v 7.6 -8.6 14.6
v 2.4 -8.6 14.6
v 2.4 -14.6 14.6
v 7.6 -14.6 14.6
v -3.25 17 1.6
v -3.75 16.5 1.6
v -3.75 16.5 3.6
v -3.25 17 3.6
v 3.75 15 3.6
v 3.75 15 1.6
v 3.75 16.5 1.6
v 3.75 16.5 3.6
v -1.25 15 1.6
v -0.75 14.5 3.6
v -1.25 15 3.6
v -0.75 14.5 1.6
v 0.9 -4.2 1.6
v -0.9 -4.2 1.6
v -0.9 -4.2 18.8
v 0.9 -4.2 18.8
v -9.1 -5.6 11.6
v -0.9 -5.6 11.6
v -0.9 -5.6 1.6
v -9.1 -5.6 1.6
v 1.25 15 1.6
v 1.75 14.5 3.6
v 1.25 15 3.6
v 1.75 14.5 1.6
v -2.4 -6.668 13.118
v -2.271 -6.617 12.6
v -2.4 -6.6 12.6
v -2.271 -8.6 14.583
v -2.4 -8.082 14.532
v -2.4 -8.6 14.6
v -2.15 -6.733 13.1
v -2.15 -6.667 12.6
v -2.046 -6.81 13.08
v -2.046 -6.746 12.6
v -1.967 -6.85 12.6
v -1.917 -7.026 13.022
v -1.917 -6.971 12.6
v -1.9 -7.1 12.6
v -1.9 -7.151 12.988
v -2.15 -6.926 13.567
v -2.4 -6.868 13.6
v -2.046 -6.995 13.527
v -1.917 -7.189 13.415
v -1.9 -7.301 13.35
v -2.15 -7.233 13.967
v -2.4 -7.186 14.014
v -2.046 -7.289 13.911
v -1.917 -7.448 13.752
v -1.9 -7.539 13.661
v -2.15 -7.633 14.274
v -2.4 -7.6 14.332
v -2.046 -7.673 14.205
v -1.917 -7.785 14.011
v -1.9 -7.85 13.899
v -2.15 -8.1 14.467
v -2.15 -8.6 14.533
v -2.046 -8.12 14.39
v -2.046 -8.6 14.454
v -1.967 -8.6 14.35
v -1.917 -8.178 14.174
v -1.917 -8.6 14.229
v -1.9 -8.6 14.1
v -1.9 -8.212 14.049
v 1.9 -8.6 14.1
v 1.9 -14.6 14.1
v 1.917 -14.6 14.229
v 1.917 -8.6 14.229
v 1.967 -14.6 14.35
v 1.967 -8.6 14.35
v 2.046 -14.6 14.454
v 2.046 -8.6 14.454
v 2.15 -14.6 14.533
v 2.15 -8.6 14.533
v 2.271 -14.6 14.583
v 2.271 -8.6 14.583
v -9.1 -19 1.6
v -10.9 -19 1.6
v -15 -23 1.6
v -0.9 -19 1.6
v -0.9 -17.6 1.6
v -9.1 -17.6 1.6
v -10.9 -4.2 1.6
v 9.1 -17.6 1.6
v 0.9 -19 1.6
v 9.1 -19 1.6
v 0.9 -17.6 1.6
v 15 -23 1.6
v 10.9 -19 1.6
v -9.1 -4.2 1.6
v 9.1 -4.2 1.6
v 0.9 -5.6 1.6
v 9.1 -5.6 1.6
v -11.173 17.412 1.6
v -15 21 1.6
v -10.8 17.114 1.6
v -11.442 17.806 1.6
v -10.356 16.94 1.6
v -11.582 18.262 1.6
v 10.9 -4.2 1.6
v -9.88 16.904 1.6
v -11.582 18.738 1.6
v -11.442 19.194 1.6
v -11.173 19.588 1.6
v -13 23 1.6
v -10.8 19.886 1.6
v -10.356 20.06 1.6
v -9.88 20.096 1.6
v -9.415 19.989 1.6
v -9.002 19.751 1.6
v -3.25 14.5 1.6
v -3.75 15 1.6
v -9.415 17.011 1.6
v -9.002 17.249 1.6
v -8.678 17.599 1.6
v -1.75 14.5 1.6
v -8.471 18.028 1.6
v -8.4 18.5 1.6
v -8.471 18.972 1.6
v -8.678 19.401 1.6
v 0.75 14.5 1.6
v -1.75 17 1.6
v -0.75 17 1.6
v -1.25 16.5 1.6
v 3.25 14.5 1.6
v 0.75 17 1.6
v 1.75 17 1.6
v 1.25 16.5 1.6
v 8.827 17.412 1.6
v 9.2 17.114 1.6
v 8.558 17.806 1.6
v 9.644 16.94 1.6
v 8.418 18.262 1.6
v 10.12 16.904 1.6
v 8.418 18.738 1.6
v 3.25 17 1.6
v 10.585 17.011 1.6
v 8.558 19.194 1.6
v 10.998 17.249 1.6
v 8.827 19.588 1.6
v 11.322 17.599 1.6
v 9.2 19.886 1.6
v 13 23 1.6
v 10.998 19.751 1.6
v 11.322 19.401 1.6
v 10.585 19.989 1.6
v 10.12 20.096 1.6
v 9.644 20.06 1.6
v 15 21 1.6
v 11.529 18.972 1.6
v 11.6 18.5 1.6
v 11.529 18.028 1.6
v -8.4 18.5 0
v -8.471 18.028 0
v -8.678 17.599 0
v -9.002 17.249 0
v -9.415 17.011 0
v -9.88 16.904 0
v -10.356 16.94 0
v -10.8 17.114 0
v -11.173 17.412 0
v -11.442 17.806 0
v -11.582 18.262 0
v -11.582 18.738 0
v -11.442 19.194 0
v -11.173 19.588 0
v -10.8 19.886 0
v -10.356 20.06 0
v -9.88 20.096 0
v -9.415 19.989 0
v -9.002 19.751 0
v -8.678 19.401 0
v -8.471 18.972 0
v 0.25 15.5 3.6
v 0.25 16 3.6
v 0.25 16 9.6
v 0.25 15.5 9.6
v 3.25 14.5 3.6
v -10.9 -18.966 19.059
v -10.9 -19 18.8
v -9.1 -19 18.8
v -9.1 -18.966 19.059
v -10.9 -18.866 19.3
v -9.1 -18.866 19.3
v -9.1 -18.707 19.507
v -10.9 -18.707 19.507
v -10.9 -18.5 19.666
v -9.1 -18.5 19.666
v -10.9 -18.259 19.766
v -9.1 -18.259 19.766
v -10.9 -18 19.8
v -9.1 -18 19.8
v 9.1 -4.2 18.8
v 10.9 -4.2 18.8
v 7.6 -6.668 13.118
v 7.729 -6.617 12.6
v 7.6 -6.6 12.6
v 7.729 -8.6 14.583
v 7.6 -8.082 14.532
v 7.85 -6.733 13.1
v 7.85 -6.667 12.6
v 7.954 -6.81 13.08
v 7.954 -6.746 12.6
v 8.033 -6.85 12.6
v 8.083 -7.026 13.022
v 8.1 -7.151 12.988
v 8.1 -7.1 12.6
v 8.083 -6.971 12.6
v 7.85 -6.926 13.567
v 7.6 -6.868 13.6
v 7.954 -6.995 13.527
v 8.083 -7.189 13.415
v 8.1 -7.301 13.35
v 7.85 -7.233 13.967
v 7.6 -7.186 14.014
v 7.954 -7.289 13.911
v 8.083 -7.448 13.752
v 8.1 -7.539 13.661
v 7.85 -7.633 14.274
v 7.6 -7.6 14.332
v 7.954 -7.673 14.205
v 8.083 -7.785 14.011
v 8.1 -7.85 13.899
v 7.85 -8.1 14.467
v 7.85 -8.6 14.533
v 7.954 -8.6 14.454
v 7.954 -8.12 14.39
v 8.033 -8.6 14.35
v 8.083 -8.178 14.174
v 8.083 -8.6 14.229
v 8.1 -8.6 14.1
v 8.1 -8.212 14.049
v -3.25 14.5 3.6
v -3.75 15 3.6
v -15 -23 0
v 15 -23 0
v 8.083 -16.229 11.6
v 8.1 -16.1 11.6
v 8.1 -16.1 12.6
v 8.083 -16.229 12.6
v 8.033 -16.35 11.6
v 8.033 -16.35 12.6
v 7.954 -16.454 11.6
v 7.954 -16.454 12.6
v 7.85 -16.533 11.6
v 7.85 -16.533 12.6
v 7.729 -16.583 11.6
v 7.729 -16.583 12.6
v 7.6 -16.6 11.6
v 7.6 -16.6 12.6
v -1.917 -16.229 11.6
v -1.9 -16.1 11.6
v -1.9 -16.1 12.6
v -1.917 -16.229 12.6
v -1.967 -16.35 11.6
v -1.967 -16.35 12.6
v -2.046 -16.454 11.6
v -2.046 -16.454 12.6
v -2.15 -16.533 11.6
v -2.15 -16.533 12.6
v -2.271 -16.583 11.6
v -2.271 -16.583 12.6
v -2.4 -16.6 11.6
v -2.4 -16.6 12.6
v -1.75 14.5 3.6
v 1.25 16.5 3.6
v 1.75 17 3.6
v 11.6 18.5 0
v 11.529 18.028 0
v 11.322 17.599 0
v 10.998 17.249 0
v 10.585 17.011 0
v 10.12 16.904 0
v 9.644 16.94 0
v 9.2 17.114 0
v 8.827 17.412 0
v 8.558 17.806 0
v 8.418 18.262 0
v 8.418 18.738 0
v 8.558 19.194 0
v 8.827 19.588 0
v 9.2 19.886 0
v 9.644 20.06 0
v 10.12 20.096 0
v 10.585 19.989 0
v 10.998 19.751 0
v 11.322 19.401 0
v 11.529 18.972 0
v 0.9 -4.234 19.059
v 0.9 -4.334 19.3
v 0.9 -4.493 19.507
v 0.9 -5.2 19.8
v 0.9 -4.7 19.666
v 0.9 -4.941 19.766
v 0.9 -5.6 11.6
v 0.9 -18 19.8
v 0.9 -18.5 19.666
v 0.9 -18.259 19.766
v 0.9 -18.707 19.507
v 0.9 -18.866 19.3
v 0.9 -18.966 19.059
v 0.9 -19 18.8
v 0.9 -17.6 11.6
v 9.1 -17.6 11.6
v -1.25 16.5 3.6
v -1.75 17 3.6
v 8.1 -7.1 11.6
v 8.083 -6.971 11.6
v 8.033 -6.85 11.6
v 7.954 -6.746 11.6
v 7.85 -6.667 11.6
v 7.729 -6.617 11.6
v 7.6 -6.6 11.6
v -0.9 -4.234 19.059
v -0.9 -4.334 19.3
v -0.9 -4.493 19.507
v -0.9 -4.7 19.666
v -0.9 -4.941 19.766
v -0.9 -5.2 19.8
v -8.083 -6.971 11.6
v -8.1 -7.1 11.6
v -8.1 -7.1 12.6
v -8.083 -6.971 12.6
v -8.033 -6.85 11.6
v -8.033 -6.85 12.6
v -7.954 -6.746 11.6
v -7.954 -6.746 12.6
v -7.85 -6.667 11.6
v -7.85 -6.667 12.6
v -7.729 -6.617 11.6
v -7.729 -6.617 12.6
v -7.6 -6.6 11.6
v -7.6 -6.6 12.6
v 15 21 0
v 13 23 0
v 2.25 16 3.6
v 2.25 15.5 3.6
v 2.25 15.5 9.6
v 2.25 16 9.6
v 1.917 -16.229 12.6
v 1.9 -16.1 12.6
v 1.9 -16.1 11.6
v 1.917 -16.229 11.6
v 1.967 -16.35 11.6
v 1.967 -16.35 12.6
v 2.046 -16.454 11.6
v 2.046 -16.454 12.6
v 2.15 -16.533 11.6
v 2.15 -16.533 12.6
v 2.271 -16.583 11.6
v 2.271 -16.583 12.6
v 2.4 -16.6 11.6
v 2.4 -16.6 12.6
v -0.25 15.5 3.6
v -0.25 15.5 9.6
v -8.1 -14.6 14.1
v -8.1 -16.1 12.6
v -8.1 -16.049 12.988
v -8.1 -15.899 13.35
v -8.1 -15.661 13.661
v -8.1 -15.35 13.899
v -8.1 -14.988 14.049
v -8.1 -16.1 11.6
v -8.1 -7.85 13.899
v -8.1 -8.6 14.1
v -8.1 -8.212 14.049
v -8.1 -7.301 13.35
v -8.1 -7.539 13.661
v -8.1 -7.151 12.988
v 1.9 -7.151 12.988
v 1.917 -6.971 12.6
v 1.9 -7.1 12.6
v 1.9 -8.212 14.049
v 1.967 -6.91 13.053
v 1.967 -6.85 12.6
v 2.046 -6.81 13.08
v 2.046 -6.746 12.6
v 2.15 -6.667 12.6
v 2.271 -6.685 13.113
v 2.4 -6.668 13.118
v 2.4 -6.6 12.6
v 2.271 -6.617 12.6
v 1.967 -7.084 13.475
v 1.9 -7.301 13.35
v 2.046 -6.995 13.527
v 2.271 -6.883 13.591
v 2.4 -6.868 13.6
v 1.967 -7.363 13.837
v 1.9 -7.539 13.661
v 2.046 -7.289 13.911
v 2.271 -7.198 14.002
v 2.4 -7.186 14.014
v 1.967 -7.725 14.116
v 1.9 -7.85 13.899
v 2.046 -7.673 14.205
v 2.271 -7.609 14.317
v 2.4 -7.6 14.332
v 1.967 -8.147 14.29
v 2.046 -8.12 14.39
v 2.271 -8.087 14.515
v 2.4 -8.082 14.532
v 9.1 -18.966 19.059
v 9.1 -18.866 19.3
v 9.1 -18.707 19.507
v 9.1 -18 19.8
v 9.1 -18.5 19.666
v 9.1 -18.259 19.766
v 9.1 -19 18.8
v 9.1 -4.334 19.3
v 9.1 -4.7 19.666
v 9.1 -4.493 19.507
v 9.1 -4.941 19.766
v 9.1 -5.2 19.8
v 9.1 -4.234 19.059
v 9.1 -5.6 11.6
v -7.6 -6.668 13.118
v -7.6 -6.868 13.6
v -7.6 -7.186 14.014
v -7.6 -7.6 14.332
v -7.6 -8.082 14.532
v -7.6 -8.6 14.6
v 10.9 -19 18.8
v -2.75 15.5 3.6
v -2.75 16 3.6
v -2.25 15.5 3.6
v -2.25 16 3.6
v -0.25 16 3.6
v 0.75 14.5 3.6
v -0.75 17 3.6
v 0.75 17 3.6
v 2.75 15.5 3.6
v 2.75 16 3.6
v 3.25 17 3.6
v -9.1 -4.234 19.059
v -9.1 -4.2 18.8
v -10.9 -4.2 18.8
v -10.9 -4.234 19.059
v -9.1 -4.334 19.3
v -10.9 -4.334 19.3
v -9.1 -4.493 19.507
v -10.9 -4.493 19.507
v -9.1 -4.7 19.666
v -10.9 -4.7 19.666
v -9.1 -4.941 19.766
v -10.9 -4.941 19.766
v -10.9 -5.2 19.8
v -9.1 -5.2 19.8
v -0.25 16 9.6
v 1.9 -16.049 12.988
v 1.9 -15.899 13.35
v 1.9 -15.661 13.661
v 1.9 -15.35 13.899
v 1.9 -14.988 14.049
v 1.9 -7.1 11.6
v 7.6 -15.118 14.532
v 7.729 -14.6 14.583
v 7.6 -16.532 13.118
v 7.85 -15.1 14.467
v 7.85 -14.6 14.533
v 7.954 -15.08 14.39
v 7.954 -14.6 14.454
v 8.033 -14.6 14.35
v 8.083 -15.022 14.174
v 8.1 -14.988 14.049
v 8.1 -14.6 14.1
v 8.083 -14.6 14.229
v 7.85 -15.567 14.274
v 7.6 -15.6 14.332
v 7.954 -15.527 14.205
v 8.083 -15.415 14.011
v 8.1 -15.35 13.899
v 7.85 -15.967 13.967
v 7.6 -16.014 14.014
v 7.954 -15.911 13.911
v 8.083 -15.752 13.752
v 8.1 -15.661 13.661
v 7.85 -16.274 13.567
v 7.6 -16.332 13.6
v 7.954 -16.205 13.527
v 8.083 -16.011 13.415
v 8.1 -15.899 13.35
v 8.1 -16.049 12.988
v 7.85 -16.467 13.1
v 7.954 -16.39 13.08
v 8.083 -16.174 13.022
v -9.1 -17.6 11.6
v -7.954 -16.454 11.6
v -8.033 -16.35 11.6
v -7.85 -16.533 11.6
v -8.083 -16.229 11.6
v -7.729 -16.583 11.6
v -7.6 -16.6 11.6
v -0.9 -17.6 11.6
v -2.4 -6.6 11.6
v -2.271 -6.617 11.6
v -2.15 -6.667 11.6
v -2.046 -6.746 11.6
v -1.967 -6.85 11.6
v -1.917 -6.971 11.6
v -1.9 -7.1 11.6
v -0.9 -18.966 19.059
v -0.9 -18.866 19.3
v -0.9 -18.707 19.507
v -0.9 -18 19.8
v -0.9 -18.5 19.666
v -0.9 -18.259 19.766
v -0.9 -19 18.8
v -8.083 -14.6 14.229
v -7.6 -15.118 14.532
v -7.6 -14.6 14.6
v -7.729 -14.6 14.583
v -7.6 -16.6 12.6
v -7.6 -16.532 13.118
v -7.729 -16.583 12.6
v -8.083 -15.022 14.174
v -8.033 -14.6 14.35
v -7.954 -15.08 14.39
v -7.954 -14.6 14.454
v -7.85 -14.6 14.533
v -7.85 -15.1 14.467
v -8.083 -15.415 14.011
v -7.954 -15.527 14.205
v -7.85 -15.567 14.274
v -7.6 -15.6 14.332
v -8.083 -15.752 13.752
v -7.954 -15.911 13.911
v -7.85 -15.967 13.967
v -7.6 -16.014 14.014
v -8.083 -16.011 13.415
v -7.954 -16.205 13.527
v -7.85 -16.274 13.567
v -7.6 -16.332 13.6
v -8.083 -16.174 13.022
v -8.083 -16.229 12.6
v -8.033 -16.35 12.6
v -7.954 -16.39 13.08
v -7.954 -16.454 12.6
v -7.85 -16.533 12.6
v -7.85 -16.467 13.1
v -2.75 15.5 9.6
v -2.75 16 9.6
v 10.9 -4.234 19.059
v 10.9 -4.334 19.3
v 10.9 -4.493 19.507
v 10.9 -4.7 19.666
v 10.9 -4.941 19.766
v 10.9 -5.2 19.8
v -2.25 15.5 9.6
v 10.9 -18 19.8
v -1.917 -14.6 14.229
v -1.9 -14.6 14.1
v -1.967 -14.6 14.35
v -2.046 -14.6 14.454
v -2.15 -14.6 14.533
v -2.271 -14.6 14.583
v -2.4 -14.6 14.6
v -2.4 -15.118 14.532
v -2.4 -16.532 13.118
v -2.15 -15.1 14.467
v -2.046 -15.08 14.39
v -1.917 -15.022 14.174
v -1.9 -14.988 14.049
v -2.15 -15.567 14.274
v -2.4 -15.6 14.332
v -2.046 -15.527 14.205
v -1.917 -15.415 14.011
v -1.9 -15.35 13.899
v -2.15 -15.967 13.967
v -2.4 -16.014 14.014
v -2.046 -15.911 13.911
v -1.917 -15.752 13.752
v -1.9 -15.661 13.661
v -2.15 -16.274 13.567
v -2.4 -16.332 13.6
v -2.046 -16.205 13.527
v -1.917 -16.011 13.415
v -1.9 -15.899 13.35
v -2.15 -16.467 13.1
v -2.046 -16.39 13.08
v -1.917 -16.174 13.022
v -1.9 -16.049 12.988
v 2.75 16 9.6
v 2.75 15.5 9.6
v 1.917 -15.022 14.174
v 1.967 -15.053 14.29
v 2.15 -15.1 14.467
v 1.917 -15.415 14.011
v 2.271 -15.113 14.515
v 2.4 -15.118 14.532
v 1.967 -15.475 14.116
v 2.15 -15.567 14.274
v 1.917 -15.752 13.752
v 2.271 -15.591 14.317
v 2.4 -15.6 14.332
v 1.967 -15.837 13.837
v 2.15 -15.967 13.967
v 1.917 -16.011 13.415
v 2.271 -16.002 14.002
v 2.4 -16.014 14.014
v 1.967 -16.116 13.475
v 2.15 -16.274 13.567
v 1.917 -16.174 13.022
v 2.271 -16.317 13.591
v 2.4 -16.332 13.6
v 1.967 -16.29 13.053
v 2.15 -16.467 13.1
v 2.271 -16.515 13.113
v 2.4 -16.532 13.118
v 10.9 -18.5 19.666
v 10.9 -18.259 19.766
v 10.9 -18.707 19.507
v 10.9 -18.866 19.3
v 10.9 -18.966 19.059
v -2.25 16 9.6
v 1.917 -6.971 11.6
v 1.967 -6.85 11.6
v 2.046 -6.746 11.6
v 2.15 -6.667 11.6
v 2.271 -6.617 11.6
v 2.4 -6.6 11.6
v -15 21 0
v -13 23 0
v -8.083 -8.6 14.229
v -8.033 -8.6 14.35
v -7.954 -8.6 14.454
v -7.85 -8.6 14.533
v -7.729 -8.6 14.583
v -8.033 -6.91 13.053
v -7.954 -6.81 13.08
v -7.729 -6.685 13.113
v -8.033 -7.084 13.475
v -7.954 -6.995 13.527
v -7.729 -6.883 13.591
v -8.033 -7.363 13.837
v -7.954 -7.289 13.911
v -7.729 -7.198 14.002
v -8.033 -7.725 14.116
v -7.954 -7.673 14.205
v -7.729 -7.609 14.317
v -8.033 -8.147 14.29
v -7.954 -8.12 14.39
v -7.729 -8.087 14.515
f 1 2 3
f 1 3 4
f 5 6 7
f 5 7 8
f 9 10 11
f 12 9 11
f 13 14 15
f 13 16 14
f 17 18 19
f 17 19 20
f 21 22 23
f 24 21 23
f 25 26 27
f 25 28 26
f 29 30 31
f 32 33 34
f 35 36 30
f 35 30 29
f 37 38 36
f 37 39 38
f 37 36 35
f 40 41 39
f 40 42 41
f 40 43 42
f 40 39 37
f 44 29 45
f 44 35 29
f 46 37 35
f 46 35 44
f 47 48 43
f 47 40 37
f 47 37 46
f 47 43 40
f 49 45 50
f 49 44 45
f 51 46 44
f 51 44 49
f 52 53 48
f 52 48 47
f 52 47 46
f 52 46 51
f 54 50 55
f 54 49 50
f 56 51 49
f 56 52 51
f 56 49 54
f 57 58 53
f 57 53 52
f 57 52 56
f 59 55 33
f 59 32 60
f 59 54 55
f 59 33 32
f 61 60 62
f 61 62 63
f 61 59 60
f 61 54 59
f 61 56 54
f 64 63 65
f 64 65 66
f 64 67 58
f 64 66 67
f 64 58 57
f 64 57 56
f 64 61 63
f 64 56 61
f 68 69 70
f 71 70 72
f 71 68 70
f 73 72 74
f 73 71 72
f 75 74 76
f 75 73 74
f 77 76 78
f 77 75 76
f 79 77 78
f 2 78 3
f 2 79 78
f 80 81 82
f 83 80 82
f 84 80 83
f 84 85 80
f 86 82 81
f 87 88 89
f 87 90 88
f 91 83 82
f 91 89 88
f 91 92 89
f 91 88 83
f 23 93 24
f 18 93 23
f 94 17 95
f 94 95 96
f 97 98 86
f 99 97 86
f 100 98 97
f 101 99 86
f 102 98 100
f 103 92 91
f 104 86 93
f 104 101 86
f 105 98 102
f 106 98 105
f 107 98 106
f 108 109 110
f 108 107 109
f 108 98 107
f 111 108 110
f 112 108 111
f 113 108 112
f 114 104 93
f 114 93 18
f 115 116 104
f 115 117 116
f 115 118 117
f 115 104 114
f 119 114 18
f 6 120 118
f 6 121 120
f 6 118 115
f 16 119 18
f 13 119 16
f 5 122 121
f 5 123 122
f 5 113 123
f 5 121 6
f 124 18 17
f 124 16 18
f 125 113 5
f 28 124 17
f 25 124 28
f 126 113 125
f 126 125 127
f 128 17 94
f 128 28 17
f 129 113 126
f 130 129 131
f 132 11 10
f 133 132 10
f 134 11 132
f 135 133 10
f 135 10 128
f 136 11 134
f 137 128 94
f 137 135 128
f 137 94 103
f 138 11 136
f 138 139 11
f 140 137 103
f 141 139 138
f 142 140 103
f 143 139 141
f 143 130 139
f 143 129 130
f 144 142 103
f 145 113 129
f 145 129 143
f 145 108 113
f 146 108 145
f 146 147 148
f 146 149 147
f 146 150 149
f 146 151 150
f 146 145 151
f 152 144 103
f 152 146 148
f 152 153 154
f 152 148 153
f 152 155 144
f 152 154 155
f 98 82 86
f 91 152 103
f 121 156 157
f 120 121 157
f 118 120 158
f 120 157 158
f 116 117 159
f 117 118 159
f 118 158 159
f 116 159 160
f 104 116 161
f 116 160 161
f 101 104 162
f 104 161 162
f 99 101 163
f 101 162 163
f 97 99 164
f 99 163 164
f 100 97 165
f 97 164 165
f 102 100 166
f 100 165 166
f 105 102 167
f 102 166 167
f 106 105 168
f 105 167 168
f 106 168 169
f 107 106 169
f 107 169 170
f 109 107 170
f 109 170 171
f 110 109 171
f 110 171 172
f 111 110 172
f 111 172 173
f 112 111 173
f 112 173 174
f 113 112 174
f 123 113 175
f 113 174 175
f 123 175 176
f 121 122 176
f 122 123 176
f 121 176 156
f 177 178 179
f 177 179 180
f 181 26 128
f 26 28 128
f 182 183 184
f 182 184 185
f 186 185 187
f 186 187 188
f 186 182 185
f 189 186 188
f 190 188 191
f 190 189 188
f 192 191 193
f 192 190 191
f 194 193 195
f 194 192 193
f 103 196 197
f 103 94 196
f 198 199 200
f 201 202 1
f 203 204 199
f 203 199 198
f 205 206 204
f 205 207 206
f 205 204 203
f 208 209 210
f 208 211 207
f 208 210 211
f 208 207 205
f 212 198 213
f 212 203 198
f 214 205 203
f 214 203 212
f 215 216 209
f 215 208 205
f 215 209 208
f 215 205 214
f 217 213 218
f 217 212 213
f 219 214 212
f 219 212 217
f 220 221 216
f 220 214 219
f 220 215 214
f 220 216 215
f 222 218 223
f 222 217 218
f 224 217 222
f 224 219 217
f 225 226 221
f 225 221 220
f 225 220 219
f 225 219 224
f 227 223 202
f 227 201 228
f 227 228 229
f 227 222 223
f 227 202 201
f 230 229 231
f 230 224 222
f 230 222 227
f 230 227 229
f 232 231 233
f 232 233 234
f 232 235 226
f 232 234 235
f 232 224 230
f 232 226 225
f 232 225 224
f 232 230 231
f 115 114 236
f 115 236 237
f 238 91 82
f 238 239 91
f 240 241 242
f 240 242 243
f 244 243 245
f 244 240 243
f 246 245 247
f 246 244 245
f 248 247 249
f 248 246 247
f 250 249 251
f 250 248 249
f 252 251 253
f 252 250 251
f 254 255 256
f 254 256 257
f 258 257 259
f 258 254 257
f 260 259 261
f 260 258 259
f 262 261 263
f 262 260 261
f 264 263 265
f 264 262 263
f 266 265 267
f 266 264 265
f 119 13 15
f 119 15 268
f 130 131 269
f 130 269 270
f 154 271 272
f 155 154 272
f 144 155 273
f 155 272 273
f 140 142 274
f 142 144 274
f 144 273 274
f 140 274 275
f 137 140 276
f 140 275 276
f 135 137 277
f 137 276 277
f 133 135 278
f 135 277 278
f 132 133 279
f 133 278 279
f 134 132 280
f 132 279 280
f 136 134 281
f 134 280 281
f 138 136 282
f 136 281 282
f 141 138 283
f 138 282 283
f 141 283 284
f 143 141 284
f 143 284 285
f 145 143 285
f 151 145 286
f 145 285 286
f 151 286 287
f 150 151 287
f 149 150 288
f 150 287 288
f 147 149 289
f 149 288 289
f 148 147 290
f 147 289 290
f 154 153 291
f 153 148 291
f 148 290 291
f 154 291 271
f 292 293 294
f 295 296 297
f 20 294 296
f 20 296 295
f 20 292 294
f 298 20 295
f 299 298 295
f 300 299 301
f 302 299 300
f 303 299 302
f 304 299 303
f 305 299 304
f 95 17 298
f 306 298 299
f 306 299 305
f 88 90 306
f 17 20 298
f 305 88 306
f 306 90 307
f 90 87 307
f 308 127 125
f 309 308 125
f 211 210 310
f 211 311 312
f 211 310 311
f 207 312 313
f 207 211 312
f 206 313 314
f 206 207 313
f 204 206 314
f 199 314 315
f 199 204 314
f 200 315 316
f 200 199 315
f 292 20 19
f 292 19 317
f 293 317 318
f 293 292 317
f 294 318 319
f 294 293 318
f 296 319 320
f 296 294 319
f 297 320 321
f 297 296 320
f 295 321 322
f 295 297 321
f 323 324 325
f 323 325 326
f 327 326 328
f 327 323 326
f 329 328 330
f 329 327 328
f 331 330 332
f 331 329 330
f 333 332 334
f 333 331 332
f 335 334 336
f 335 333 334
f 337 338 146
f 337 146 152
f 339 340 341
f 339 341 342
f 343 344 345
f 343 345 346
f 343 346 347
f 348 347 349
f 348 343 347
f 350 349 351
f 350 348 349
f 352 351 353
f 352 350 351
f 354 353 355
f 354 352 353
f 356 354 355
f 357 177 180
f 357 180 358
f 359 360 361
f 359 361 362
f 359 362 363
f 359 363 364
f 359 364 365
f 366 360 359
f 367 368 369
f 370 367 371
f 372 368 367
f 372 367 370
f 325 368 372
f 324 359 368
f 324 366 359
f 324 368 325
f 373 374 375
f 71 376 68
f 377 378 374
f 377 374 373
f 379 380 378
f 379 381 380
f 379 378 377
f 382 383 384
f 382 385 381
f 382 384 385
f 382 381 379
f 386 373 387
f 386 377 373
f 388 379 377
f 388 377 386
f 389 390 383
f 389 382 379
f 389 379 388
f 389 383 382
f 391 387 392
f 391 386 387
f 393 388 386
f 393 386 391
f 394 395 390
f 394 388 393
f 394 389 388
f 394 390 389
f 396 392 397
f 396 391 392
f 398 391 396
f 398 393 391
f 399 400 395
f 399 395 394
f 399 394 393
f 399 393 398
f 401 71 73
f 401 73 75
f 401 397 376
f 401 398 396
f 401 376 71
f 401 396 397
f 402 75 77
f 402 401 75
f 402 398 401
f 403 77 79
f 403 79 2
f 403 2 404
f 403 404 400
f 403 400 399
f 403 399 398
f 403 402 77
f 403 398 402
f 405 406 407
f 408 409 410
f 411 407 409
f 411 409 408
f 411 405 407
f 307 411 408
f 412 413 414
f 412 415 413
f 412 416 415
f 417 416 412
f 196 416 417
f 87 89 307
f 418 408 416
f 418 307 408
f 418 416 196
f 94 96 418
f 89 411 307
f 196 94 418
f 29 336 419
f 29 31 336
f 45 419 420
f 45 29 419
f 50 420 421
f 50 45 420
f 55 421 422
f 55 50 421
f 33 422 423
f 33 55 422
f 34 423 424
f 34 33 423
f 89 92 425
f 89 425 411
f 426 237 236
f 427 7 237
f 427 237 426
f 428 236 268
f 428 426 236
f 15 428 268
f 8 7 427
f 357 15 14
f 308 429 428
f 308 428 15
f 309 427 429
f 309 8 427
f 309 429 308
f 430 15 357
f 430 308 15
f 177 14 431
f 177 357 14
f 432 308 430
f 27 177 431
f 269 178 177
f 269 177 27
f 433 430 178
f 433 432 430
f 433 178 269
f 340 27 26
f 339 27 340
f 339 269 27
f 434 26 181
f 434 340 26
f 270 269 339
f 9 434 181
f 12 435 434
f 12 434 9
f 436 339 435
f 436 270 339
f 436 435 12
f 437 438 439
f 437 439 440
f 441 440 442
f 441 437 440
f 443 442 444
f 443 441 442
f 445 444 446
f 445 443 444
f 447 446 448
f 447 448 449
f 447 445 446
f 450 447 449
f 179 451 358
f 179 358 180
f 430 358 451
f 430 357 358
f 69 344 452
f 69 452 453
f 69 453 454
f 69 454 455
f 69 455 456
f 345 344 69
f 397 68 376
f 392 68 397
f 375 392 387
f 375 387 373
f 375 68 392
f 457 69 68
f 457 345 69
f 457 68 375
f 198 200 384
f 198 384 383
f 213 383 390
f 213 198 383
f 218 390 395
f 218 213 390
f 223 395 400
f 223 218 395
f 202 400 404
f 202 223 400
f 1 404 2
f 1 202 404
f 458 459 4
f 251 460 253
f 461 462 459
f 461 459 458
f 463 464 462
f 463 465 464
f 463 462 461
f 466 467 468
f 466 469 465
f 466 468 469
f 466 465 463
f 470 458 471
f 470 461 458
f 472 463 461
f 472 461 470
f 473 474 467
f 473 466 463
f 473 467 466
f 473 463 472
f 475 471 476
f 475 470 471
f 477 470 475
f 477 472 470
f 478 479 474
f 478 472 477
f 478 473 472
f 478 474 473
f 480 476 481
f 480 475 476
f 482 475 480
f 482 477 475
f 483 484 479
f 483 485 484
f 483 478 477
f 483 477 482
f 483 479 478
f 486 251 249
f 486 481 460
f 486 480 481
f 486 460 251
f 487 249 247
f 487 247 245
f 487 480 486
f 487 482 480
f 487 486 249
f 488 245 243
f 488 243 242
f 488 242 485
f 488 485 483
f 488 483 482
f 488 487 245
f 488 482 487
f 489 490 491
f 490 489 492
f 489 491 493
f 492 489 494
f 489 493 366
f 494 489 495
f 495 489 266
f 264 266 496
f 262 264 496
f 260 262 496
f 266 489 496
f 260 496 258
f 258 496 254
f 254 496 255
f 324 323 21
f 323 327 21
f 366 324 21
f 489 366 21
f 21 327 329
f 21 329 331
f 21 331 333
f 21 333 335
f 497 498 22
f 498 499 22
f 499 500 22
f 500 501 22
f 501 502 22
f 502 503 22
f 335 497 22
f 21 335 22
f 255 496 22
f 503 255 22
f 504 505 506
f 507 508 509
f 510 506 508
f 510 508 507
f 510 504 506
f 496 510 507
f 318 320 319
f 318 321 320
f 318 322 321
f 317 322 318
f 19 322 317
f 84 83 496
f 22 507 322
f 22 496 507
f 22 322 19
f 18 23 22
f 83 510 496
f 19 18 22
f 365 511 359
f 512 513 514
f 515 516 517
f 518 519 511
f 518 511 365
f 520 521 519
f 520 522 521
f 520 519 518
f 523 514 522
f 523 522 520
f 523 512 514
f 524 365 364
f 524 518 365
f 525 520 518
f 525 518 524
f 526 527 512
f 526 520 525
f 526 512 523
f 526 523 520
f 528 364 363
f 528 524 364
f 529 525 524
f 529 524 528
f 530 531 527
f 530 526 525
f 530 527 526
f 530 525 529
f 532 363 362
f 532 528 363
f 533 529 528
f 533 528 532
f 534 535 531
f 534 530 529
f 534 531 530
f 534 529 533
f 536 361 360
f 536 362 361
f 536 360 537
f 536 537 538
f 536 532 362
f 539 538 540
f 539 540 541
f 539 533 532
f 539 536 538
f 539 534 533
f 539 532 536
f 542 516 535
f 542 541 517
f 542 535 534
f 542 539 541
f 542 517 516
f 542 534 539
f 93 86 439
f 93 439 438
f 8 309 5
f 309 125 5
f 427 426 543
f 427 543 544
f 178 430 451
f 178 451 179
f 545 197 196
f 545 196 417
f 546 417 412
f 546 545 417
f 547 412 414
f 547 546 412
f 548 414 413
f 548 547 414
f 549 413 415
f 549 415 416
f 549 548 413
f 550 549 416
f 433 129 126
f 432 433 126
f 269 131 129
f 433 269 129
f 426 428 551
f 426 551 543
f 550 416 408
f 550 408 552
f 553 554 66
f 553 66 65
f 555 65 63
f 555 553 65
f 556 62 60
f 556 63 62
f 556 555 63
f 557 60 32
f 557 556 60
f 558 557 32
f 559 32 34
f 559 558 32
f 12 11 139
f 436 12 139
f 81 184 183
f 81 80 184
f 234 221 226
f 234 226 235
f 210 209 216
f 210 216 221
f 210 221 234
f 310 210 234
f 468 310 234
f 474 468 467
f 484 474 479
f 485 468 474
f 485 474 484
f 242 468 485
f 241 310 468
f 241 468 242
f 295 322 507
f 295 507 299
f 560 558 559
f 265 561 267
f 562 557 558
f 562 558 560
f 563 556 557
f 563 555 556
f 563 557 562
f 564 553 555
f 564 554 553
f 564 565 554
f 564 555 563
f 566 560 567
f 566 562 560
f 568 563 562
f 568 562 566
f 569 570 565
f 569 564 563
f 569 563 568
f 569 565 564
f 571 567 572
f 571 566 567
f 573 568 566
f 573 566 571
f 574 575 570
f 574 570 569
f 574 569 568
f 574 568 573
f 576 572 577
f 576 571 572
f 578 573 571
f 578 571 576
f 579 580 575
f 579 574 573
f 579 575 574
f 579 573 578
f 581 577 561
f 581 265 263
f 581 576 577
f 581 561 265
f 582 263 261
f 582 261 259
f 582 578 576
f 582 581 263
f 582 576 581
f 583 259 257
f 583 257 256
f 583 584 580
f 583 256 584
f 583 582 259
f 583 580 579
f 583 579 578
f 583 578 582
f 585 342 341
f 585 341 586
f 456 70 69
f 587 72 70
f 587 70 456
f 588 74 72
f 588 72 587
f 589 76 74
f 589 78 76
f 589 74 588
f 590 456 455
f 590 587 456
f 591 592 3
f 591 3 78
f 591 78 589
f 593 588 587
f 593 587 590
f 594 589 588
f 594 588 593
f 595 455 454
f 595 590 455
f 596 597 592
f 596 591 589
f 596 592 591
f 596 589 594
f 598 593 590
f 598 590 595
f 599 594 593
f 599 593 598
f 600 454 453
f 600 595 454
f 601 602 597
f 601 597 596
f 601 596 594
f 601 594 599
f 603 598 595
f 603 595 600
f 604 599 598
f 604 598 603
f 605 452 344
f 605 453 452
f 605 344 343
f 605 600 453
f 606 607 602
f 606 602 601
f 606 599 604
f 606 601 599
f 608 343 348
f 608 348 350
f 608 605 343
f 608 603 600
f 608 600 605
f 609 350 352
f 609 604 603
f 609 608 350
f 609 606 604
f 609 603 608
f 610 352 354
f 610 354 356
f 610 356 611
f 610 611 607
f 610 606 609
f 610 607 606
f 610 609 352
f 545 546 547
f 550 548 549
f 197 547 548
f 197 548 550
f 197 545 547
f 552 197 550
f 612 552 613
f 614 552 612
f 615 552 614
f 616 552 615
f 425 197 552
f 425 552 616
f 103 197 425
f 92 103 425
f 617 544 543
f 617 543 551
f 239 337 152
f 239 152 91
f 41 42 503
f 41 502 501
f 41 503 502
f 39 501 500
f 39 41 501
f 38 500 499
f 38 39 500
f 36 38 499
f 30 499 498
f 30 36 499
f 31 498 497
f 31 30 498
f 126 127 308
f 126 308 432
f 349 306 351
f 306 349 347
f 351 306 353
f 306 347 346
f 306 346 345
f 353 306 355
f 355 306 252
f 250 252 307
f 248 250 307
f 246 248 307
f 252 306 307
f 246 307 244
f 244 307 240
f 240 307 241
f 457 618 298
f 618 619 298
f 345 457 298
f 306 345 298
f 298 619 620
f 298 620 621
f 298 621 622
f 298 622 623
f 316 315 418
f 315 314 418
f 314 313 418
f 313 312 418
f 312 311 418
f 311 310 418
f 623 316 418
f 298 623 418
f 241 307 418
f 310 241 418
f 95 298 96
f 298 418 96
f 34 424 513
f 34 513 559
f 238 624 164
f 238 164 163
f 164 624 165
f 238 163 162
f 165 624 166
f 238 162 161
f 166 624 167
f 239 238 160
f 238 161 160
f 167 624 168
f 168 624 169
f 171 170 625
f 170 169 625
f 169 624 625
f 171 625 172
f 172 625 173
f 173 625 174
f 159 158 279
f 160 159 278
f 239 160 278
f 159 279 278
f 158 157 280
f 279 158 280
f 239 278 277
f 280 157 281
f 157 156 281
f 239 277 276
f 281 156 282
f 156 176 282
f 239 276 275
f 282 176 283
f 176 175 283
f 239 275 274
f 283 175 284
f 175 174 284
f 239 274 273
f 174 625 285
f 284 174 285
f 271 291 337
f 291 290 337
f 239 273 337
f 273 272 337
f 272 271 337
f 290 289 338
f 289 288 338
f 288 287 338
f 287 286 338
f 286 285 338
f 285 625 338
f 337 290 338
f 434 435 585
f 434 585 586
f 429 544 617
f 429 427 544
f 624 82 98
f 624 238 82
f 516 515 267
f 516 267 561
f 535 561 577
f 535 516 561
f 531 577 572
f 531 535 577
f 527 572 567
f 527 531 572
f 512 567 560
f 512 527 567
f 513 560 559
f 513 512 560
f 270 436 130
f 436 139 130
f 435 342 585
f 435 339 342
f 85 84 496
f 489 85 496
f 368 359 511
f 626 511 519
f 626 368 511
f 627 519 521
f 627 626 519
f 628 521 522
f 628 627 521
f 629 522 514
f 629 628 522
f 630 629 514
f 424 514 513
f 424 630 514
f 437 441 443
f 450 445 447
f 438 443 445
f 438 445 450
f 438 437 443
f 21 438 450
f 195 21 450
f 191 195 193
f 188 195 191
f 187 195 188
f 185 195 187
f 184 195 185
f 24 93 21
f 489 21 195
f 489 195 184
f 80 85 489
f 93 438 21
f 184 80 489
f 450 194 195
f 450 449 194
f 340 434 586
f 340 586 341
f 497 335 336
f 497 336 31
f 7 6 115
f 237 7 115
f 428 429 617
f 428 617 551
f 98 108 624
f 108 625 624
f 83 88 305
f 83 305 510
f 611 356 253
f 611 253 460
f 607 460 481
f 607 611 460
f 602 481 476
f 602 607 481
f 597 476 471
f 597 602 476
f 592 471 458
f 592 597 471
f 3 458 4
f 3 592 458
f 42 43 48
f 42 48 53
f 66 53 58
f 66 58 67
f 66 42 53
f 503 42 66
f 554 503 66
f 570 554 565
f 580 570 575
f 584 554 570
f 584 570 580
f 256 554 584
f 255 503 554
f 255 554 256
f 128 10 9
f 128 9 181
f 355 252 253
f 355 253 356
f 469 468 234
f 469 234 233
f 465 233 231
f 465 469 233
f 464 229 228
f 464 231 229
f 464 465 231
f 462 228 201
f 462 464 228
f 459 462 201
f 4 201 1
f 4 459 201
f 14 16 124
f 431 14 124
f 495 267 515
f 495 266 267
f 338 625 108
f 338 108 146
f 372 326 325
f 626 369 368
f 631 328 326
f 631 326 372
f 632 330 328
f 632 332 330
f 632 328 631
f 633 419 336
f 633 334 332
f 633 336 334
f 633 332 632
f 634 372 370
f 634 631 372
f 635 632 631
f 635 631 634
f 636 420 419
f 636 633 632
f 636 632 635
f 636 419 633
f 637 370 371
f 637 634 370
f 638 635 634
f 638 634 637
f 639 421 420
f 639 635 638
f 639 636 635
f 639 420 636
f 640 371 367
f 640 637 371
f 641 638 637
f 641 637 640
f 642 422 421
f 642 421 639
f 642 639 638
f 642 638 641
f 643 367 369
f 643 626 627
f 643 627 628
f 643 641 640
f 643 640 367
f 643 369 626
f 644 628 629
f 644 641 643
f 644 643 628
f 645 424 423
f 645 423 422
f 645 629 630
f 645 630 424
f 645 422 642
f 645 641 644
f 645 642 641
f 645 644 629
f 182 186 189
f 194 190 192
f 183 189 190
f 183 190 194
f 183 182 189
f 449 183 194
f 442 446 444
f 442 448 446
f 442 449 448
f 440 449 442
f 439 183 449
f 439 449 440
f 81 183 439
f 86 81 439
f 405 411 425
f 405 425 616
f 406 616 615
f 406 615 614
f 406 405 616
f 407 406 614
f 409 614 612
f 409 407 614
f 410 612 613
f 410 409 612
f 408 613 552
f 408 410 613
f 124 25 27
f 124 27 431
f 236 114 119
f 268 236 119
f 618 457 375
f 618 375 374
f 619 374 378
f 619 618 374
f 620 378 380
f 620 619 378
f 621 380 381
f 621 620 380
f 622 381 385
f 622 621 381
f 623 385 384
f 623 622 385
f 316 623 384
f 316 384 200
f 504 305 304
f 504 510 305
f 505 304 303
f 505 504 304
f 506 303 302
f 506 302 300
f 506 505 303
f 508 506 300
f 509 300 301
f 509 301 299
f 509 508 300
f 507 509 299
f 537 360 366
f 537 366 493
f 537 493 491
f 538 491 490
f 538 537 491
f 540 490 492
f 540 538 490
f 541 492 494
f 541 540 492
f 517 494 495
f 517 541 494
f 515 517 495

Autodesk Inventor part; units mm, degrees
ref_plane "YZ Plane" through (0, 0, 0) normal (1, 0, 0) x (0, 1, 0)
ref_plane "XZ Plane" through (0, 0, 0) normal (0, 1, 0) x (-1, 0, 0)
ref_plane "XY Plane" through (0, 0, 0) normal (0, 0, 1) x (1, 0, 0)
sketch "Sketch1" plane through (0, 0, 0) normal (0, 0, 1) x (1, 0, 0)
  line L0 (-13, 23) -> (13, 23)
  line L1 (15, 21) -> (15, -23)
  line L2 (15, -23) -> (-15, -23)
  line L3 (-15, -23) -> (-15, 21)
  line L4 (-15, 23) -> (15, -23) construction
  line L5 (15, 23) -> (-15, -23) construction
  line L6 (-13, 23) -> (-15, 21)
  line L7 (13, 23) -> (15, 21)
  circle A0 centre (-10, 18.5) radius 1.6
  circle A1 centre (10, 18.5) radius 1.6
  line L8 (10, 18.5) -> (-10, 18.5) construction
  point P0 (0, 0)
  point P1 (0, 18.5)
  point P2 (0, 0)
  dimension "d0" = 30
  dimension "d1" = 46
  dimension "d2" = 2
  dimension "d3" = 2
  dimension "d4" = 2
  dimension "d5" = 2
  dimension "d6" = 3.2
  dimension "d7" = 20
  dimension "d8" = 4.5
extrude "Extrusion1" add sketch "Sketch1" along normal blind 1.6
sketch "Sketch2" plane through (0, 0, 1.6) normal (0, 0, 1) x (1, 0, 0)
  line L0 (10.9, -19) -> (9.1, -19)
  line L1 (9.1, -19) -> (9.1, -4.2)
  line L2 (9.1, -4.2) -> (10.9, -4.2)
  line L3 (10.9, -4.2) -> (10.9, -19)
  line L4 (0.9, -19) -> (-0.9, -19)
  line L5 (-0.9, -19) -> (-0.9, -4.2)
  line L6 (-0.9, -4.2) -> (0.9, -4.2)
  line L7 (0.9, -4.2) -> (0.9, -19)
  line L8 (-9.1, -19) -> (-10.9, -19)
  line L9 (-10.9, -19) -> (-10.9, -4.2)
  line L10 (-10.9, -4.2) -> (-9.1, -4.2)
  line L11 (-9.1, -4.2) -> (-9.1, -19)
  line L12 (-15, 21) -> (-15, -23) projected
  line L13 (-15, -23) -> (15, -23) projected
  line L14 (15, -23) -> (15, 21) projected
  line L15 (15, 21) -> (13, 23) projected
  line L16 (13, 23) -> (-13, 23) projected
  line L17 (-13, 23) -> (-15, 21) projected
  circle A0 centre (10, 18.5) radius 1.6 projected
  circle A1 centre (-10, 18.5) radius 1.6 projected
  line L18 (-0.9, -4.2) -> (0.9, -19) construction
  line L19 (0.9, -4.2) -> (-0.9, -19) construction
  line L20 (10.9, -4.2) -> (9.1, -19) construction
  line L21 (9.1, -4.2) -> (10.9, -19) construction
  line L22 (-10.9, -4.2) -> (-9.1, -19) construction
  line L23 (-9.1, -4.2) -> (-10.9, -19) construction
  point P0 (0, 0)
  point P1 (0, -11.6)
  dimension "d11" = 1.8
  dimension "d12" = 14.8
  dimension "d13" = 4
  dimension "d14" = 8.2
  dimension "d15" = 8.2
extrude "Extrusion2" add sketch "Sketch2" along normal blind 18.2 contours L0 L1 L2 L3 | L4 L5 L6 L7 | L8 L9 L10 L11
fillet "Fillet1" radius 1 6 edges at (-10, -19, 19.8) (-10, -4.2, 19.8) (0, -4.2, 19.8) (0, -19, 19.8) (10, -19, 19.8) (10, -4.2, 19.8)
sketch "Sketch3" plane through (9.1, -19, 1.6) normal (-1, 0, 0) x (0, 0, 1)
  arc A0 (18.2, 13.8) -> (17.2, 14.8) centre (17.2, 13.8) ccw projected
  line L0 (0, 14.8) -> (17.2, 14.8) projected
  line L1 (0, 0) -> (0, 14.8) projected
  line L2 (0, 0) -> (17.2, 0) projected
  arc A1 (17.2, 0) -> (18.2, 1) centre (17.2, 1) ccw projected
  line L3 (18.2, 13.8) -> (18.2, 1) projected
  line L4 (0, 0) -> (0, 14.8) projected
  line L5 (10, 13.4) -> (0, 13.4)
  line L6 (0, 13.4) -> (0, 1.4)
  line L7 (0, 1.4) -> (10, 1.4)
  line L8 (10, 1.4) -> (10, 13.4)
  line L9 (10, 13.4) -> (0, 1.4) construction
  line L10 (0, 13.4) -> (10, 1.4) construction
  point P0 (-1.6, 19)
  point P1 (5, 7.4)
  point P2 (5, 7.4)
  point P3 (18.2, 7.4)
  point P4 (0, 13.4)
  point P5 (0, 1.4)
  dimension "d19" = 10
  dimension "d20" = 12
extrude "Extrusion3" add sketch "Sketch3" along normal up to surface (18.2 mm away) contours L5 L8 L7 L1
sketch "Sketch4" plane through (0, 0, 1.6) normal (0, 0, 1) x (1, 0, 0)
  circle A0 centre (-10, 18.5) radius 1.6 projected
  circle A1 centre (10, 18.5) radius 1.6 projected
  line L0 (-15, 21) -> (-15, -23) projected
  line L1 (-15, -23) -> (15, -23) projected
  line L2 (15, -23) -> (15, 21) projected
  line L3 (15, 21) -> (13, 23) projected
  line L4 (13, 23) -> (-13, 23) projected
  line L5 (-13, 23) -> (-15, 21) projected
  line L6 (-0.9, -17.6) -> (-9.1, -17.6) projected
  line L7 (-9.1, -17.6) -> (-9.1, -19) projected
  line L8 (-9.1, -19) -> (-10.9, -19) projected
  line L9 (-10.9, -19) -> (-10.9, -4.2) projected
  line L10 (-10.9, -4.2) -> (-9.1, -4.2) projected
  line L11 (-9.1, -4.2) -> (-9.1, -5.6) projected
  line L12 (-9.1, -5.6) -> (-0.9, -5.6) projected
  line L13 (-0.9, -5.6) -> (-0.9, -4.2) projected
  line L14 (-0.9, -4.2) -> (0.9, -4.2) projected
  line L15 (0.9, -4.2) -> (0.9, -5.6) projected
  line L16 (0.9, -5.6) -> (9.1, -5.6) projected
  line L17 (9.1, -5.6) -> (9.1, -4.2) projected
  line L18 (9.1, -4.2) -> (10.9, -4.2) projected
  line L19 (10.9, -4.2) -> (10.9, -19) projected
  line L20 (10.9, -19) -> (9.1, -19) projected
  line L21 (9.1, -19) -> (9.1, -17.6) projected
  line L22 (9.1, -17.6) -> (0.9, -17.6) projected
  line L23 (0.9, -17.6) -> (0.9, -19) projected
  line L24 (0.9, -19) -> (-0.9, -19) projected
  line L25 (-0.9, -19) -> (-0.9, -17.6) projected
  line L26 (0.75, 17) -> (-0.75, 17)
  line L27 (-1.25, 16.5) -> (-1.25, 15)
  line L28 (-0.75, 14.5) -> (0.75, 14.5)
  line L29 (1.25, 15) -> (1.25, 16.5)
  line L30 (1.25, 16.5) -> (0.75, 17)
  line L31 (1.25, 15) -> (0.75, 14.5)
  line L32 (-0.75, 14.5) -> (-1.25, 15)
  line L33 (-1.25, 16.5) -> (-0.75, 17)
  line L34 (-3.75, 16.5) -> (-3.25, 17)
  line L35 (-3.75, 16.5) -> (-3.75, 15)
  line L36 (-3.25, 14.5) -> (-3.75, 15)
  line L37 (-1.75, 17) -> (-3.25, 17)
  line L38 (-3.25, 14.5) -> (-1.75, 14.5)
  line L39 (-1.25, 15) -> (-1.75, 14.5)
  line L40 (-1.25, 15) -> (-1.25, 16.5)
  line L41 (-1.25, 16.5) -> (-1.75, 17)
  line L42 (1.25, 16.5) -> (1.75, 17)
  line L43 (1.25, 16.5) -> (1.25, 15)
  line L44 (1.75, 14.5) -> (1.25, 15)
  line L45 (3.25, 17) -> (1.75, 17)
  line L46 (1.75, 14.5) -> (3.25, 14.5)
  line L47 (3.75, 15) -> (3.25, 14.5)
  line L48 (3.75, 15) -> (3.75, 16.5)
  line L49 (3.75, 16.5) -> (3.25, 17)
  line L50 (-1.25, 16.5) -> (-0.75, 17)
  line L51 (-1.25, 16.5) -> (-1.25, 15)
  line L52 (-0.75, 14.5) -> (-1.25, 15)
  line L53 (0.75, 17) -> (-0.75, 17)
  line L54 (-0.75, 14.5) -> (0.75, 14.5)
  line L55 (1.25, 15) -> (0.75, 14.5)
  line L56 (1.25, 15) -> (1.25, 16.5)
  line L57 (1.25, 16.5) -> (0.75, 17)
  point P0 (0, 0)
  point P1 (1.25, 17)
  point P2 (-1.25, 14.5)
  point P3 (-1.25, 17)
  point P4 (1.25, 14.5)
  point P5 (0, 17)
  point P6 (0, 23)
  point P7 (-3.75, 17)
  point P8 (-3.75, 14.5)
  point P9 (-2.5, 17)
  point P10 (-1.25, 17)
  point P11 (-1.25, 14.5)
  point P12 (1.25, 17)
  point P13 (1.25, 14.5)
  point P14 (2.5, 17)
  point P15 (3.75, 17)
  point P16 (3.75, 14.5)
  point P17 (-1.25, 17)
  point P18 (-1.25, 14.5)
  point P19 (0, 17)
  point P20 (1.25, 17)
  point P21 (1.25, 14.5)
  dimension "d23" = 2.5
  dimension "d24" = 2.5
  dimension "d25" = 0.5
  dimension "d26" = 0.5
  dimension "d27" = 0.5
  dimension "d28" = 0.5
  dimension "d29" = 0.5
  dimension "d30" = 0.5
  dimension "d31" = 0.5
  dimension "d32" = 0.5
  dimension "d33" = 6
  dimension "d36" = 2.5
  dimension "d39" = 2.5
extrude "Extrusion4" add sketch "Sketch4" along normal blind 2 contours L30 L29 L31 L28 L32 L27 L33 L26 | L42 L45 L49 L48 L47 L46 L44 L29 | L27 L39 L38 L36 L35 L34 L37 L41
sketch "Sketch5" plane through (0, 0, 3.6) normal (0, 0, 1) x (1, 0, 0)
  line L0 (1.25, 16.5) -> (0.75, 17) projected
  line L1 (0.75, 17) -> (-0.75, 17) projected
  line L2 (-0.75, 17) -> (-1.25, 16.5) projected
  line L3 (-1.25, 16.5) -> (-1.75, 17) projected
  line L4 (-1.75, 17) -> (-3.25, 17) projected
  line L5 (-3.25, 17) -> (-3.75, 16.5) projected
  line L6 (-3.75, 16.5) -> (-3.75, 15) projected
  line L7 (-3.75, 15) -> (-3.25, 14.5) projected
  line L8 (-3.25, 14.5) -> (-1.75, 14.5) projected
  line L9 (-1.75, 14.5) -> (-1.25, 15) projected
  line L10 (-1.25, 15) -> (-0.75, 14.5) projected
  line L11 (-0.75, 14.5) -> (0.75, 14.5) projected
  line L12 (0.75, 14.5) -> (1.25, 15) projected
  line L13 (1.25, 15) -> (1.75, 14.5) projected
  line L14 (1.75, 14.5) -> (3.25, 14.5) projected
  line L15 (3.25, 14.5) -> (3.75, 15) projected
  line L16 (3.75, 15) -> (3.75, 16.5) projected
  line L17 (3.75, 16.5) -> (3.25, 17) projected
  line L18 (3.25, 17) -> (1.75, 17) projected
  line L19 (1.75, 17) -> (1.25, 16.5) projected
  line L20 (-3.75, 16.5) -> (-3.75, 15) projected
  line L21 (2.75, 15.5) -> (2.25, 15.5)
  line L22 (2.25, 15.5) -> (2.25, 16)
  line L23 (2.25, 16) -> (2.75, 16)
  line L24 (2.75, 16) -> (2.75, 15.5)
  line L25 (2.75, 15.5) -> (2.25, 16) construction
  line L26 (2.25, 15.5) -> (2.75, 16) construction
  line L27 (0.25, 15.5) -> (-0.25, 15.5)
  line L28 (-0.25, 15.5) -> (-0.25, 16)
  line L29 (-0.25, 16) -> (0.25, 16)
  line L30 (0.25, 16) -> (0.25, 15.5)
  line L31 (0.25, 15.5) -> (-0.25, 16) construction
  line L32 (-0.25, 15.5) -> (0.25, 16) construction
  line L33 (-2.25, 15.5) -> (-2.75, 15.5)
  line L34 (-2.75, 15.5) -> (-2.75, 16)
  line L35 (-2.75, 16) -> (-2.25, 16)
  line L36 (-2.25, 16) -> (-2.25, 15.5)
  line L37 (-2.25, 15.5) -> (-2.75, 16) construction
  line L38 (-2.75, 15.5) -> (-2.25, 16) construction
  point P0 (0, 0)
  point P1 (2.5, 15.75)
  point P2 (0, 15.75)
  point P3 (-2.5, 15.75)
  point P4 (2.5, 14.5)
  point P5 (0, 14.5)
  point P6 (-2.5, 14.5)
  point P7 (-3.75, 15.75)
  point P8 (-3.75, 15.75)
  point P9 (3.75, 15.75)
  dimension "d44" = 0.5
  dimension "d45" = 0.5
  dimension "d46" = 0.5
  dimension "d47" = 0.5
  dimension "d48" = 0.5
  dimension "d49" = 0.5
extrude "Extrusion5" add sketch "Sketch5" along normal blind 6 contours L21 L22 L23 L24 | L27 L28 L29 L30 | L33 L34 L35 L36
sketch "Sketch6" plane through (9.1, -17.6, 11.6) normal (0, 0, 1) x (1, 0, 0)
  line L0 (-8.2, 0) -> (-8.2, 12) projected
  line L1 (0, 0) -> (-8.2, 0) projected
  line L2 (0, 12) -> (0, 0) projected
  line L3 (0, 12) -> (-8.2, 12) projected
  line L4 (-10, 12) -> (-10, 0) projected
  line L5 (-10, 12) -> (-18.2, 12) projected
  line L6 (-18.2, 0) -> (-18.2, 12) projected
  line L7 (-10, 0) -> (-18.2, 0) projected
  line L8 (-7.2, 1) -> (-7.2, 11)
  line L9 (-7.2, 11) -> (-1, 11)
  line L10 (-1, 11) -> (-1, 1)
  line L11 (-1, 1) -> (-7.2, 1)
  line L12 (-17.2, 1) -> (-17.2, 11)
  line L13 (-17.2, 11) -> (-11, 11)
  line L14 (-11, 11) -> (-11, 1)
  line L15 (-11, 1) -> (-17.2, 1)
  point P0 (-9.1, 17.6)
  dimension "d52" = 1
  dimension "d53" = 1
extrude "Extrusion6" add sketch "Sketch6" along normal blind 3 contours L8 L9 L10 L11 | L12 L13 L14 L15
fillet "Fillet2" radius 2 4 edges at (5, -6.6, 14.6) (5, -16.6, 14.6) (-5, -6.6, 14.6) (-5, -16.6, 14.6)
fillet "Fillet3" radius 0.5 20 edges at (8.1, -6.6, 12.1) (8.1, -11.6, 14.6) (8.1, -16.0142, 14.0142) (8.1, -16.6, 12.1) (8.1, -7.1858, 14.0142) (1.9, -11.6, 14.6) (1.9, -16.0142, 14.0142) (1.9, -16.6, 12.1) (1.9, -6.6, 12.1) (1.9, -7.1858, 14.0142) (-1.9, -6.6, 12.1) (-1.9, -11.6, 14.6) (-1.9, -16.0142, 14.0142) (-1.9, -16.6, 12.1) (-1.9, -7.1858, 14.0142) (-8.1, -11.6, 14.6) (-8.1, -16.0142, 14.0142) (-8.1, -16.6, 12.1) (-8.1, -6.6, 12.1) (-8.1, -7.1858, 14.0142)
equation "\"d3\" = d2"
equation "\"d4\" = d2"
equation "\"d5\" = d4"
equation "\"d15\" = d14"
equation "\"d26\" = d25"
equation "\"d27\" = d25"
equation "\"d28\" = d27"
equation "\"d29\" = d25"
equation "\"d30\" = d29"
equation "\"d31\" = d25"
equation "\"d32\" = d31"
properties part number "current sensor" material "ABS Plastic"
